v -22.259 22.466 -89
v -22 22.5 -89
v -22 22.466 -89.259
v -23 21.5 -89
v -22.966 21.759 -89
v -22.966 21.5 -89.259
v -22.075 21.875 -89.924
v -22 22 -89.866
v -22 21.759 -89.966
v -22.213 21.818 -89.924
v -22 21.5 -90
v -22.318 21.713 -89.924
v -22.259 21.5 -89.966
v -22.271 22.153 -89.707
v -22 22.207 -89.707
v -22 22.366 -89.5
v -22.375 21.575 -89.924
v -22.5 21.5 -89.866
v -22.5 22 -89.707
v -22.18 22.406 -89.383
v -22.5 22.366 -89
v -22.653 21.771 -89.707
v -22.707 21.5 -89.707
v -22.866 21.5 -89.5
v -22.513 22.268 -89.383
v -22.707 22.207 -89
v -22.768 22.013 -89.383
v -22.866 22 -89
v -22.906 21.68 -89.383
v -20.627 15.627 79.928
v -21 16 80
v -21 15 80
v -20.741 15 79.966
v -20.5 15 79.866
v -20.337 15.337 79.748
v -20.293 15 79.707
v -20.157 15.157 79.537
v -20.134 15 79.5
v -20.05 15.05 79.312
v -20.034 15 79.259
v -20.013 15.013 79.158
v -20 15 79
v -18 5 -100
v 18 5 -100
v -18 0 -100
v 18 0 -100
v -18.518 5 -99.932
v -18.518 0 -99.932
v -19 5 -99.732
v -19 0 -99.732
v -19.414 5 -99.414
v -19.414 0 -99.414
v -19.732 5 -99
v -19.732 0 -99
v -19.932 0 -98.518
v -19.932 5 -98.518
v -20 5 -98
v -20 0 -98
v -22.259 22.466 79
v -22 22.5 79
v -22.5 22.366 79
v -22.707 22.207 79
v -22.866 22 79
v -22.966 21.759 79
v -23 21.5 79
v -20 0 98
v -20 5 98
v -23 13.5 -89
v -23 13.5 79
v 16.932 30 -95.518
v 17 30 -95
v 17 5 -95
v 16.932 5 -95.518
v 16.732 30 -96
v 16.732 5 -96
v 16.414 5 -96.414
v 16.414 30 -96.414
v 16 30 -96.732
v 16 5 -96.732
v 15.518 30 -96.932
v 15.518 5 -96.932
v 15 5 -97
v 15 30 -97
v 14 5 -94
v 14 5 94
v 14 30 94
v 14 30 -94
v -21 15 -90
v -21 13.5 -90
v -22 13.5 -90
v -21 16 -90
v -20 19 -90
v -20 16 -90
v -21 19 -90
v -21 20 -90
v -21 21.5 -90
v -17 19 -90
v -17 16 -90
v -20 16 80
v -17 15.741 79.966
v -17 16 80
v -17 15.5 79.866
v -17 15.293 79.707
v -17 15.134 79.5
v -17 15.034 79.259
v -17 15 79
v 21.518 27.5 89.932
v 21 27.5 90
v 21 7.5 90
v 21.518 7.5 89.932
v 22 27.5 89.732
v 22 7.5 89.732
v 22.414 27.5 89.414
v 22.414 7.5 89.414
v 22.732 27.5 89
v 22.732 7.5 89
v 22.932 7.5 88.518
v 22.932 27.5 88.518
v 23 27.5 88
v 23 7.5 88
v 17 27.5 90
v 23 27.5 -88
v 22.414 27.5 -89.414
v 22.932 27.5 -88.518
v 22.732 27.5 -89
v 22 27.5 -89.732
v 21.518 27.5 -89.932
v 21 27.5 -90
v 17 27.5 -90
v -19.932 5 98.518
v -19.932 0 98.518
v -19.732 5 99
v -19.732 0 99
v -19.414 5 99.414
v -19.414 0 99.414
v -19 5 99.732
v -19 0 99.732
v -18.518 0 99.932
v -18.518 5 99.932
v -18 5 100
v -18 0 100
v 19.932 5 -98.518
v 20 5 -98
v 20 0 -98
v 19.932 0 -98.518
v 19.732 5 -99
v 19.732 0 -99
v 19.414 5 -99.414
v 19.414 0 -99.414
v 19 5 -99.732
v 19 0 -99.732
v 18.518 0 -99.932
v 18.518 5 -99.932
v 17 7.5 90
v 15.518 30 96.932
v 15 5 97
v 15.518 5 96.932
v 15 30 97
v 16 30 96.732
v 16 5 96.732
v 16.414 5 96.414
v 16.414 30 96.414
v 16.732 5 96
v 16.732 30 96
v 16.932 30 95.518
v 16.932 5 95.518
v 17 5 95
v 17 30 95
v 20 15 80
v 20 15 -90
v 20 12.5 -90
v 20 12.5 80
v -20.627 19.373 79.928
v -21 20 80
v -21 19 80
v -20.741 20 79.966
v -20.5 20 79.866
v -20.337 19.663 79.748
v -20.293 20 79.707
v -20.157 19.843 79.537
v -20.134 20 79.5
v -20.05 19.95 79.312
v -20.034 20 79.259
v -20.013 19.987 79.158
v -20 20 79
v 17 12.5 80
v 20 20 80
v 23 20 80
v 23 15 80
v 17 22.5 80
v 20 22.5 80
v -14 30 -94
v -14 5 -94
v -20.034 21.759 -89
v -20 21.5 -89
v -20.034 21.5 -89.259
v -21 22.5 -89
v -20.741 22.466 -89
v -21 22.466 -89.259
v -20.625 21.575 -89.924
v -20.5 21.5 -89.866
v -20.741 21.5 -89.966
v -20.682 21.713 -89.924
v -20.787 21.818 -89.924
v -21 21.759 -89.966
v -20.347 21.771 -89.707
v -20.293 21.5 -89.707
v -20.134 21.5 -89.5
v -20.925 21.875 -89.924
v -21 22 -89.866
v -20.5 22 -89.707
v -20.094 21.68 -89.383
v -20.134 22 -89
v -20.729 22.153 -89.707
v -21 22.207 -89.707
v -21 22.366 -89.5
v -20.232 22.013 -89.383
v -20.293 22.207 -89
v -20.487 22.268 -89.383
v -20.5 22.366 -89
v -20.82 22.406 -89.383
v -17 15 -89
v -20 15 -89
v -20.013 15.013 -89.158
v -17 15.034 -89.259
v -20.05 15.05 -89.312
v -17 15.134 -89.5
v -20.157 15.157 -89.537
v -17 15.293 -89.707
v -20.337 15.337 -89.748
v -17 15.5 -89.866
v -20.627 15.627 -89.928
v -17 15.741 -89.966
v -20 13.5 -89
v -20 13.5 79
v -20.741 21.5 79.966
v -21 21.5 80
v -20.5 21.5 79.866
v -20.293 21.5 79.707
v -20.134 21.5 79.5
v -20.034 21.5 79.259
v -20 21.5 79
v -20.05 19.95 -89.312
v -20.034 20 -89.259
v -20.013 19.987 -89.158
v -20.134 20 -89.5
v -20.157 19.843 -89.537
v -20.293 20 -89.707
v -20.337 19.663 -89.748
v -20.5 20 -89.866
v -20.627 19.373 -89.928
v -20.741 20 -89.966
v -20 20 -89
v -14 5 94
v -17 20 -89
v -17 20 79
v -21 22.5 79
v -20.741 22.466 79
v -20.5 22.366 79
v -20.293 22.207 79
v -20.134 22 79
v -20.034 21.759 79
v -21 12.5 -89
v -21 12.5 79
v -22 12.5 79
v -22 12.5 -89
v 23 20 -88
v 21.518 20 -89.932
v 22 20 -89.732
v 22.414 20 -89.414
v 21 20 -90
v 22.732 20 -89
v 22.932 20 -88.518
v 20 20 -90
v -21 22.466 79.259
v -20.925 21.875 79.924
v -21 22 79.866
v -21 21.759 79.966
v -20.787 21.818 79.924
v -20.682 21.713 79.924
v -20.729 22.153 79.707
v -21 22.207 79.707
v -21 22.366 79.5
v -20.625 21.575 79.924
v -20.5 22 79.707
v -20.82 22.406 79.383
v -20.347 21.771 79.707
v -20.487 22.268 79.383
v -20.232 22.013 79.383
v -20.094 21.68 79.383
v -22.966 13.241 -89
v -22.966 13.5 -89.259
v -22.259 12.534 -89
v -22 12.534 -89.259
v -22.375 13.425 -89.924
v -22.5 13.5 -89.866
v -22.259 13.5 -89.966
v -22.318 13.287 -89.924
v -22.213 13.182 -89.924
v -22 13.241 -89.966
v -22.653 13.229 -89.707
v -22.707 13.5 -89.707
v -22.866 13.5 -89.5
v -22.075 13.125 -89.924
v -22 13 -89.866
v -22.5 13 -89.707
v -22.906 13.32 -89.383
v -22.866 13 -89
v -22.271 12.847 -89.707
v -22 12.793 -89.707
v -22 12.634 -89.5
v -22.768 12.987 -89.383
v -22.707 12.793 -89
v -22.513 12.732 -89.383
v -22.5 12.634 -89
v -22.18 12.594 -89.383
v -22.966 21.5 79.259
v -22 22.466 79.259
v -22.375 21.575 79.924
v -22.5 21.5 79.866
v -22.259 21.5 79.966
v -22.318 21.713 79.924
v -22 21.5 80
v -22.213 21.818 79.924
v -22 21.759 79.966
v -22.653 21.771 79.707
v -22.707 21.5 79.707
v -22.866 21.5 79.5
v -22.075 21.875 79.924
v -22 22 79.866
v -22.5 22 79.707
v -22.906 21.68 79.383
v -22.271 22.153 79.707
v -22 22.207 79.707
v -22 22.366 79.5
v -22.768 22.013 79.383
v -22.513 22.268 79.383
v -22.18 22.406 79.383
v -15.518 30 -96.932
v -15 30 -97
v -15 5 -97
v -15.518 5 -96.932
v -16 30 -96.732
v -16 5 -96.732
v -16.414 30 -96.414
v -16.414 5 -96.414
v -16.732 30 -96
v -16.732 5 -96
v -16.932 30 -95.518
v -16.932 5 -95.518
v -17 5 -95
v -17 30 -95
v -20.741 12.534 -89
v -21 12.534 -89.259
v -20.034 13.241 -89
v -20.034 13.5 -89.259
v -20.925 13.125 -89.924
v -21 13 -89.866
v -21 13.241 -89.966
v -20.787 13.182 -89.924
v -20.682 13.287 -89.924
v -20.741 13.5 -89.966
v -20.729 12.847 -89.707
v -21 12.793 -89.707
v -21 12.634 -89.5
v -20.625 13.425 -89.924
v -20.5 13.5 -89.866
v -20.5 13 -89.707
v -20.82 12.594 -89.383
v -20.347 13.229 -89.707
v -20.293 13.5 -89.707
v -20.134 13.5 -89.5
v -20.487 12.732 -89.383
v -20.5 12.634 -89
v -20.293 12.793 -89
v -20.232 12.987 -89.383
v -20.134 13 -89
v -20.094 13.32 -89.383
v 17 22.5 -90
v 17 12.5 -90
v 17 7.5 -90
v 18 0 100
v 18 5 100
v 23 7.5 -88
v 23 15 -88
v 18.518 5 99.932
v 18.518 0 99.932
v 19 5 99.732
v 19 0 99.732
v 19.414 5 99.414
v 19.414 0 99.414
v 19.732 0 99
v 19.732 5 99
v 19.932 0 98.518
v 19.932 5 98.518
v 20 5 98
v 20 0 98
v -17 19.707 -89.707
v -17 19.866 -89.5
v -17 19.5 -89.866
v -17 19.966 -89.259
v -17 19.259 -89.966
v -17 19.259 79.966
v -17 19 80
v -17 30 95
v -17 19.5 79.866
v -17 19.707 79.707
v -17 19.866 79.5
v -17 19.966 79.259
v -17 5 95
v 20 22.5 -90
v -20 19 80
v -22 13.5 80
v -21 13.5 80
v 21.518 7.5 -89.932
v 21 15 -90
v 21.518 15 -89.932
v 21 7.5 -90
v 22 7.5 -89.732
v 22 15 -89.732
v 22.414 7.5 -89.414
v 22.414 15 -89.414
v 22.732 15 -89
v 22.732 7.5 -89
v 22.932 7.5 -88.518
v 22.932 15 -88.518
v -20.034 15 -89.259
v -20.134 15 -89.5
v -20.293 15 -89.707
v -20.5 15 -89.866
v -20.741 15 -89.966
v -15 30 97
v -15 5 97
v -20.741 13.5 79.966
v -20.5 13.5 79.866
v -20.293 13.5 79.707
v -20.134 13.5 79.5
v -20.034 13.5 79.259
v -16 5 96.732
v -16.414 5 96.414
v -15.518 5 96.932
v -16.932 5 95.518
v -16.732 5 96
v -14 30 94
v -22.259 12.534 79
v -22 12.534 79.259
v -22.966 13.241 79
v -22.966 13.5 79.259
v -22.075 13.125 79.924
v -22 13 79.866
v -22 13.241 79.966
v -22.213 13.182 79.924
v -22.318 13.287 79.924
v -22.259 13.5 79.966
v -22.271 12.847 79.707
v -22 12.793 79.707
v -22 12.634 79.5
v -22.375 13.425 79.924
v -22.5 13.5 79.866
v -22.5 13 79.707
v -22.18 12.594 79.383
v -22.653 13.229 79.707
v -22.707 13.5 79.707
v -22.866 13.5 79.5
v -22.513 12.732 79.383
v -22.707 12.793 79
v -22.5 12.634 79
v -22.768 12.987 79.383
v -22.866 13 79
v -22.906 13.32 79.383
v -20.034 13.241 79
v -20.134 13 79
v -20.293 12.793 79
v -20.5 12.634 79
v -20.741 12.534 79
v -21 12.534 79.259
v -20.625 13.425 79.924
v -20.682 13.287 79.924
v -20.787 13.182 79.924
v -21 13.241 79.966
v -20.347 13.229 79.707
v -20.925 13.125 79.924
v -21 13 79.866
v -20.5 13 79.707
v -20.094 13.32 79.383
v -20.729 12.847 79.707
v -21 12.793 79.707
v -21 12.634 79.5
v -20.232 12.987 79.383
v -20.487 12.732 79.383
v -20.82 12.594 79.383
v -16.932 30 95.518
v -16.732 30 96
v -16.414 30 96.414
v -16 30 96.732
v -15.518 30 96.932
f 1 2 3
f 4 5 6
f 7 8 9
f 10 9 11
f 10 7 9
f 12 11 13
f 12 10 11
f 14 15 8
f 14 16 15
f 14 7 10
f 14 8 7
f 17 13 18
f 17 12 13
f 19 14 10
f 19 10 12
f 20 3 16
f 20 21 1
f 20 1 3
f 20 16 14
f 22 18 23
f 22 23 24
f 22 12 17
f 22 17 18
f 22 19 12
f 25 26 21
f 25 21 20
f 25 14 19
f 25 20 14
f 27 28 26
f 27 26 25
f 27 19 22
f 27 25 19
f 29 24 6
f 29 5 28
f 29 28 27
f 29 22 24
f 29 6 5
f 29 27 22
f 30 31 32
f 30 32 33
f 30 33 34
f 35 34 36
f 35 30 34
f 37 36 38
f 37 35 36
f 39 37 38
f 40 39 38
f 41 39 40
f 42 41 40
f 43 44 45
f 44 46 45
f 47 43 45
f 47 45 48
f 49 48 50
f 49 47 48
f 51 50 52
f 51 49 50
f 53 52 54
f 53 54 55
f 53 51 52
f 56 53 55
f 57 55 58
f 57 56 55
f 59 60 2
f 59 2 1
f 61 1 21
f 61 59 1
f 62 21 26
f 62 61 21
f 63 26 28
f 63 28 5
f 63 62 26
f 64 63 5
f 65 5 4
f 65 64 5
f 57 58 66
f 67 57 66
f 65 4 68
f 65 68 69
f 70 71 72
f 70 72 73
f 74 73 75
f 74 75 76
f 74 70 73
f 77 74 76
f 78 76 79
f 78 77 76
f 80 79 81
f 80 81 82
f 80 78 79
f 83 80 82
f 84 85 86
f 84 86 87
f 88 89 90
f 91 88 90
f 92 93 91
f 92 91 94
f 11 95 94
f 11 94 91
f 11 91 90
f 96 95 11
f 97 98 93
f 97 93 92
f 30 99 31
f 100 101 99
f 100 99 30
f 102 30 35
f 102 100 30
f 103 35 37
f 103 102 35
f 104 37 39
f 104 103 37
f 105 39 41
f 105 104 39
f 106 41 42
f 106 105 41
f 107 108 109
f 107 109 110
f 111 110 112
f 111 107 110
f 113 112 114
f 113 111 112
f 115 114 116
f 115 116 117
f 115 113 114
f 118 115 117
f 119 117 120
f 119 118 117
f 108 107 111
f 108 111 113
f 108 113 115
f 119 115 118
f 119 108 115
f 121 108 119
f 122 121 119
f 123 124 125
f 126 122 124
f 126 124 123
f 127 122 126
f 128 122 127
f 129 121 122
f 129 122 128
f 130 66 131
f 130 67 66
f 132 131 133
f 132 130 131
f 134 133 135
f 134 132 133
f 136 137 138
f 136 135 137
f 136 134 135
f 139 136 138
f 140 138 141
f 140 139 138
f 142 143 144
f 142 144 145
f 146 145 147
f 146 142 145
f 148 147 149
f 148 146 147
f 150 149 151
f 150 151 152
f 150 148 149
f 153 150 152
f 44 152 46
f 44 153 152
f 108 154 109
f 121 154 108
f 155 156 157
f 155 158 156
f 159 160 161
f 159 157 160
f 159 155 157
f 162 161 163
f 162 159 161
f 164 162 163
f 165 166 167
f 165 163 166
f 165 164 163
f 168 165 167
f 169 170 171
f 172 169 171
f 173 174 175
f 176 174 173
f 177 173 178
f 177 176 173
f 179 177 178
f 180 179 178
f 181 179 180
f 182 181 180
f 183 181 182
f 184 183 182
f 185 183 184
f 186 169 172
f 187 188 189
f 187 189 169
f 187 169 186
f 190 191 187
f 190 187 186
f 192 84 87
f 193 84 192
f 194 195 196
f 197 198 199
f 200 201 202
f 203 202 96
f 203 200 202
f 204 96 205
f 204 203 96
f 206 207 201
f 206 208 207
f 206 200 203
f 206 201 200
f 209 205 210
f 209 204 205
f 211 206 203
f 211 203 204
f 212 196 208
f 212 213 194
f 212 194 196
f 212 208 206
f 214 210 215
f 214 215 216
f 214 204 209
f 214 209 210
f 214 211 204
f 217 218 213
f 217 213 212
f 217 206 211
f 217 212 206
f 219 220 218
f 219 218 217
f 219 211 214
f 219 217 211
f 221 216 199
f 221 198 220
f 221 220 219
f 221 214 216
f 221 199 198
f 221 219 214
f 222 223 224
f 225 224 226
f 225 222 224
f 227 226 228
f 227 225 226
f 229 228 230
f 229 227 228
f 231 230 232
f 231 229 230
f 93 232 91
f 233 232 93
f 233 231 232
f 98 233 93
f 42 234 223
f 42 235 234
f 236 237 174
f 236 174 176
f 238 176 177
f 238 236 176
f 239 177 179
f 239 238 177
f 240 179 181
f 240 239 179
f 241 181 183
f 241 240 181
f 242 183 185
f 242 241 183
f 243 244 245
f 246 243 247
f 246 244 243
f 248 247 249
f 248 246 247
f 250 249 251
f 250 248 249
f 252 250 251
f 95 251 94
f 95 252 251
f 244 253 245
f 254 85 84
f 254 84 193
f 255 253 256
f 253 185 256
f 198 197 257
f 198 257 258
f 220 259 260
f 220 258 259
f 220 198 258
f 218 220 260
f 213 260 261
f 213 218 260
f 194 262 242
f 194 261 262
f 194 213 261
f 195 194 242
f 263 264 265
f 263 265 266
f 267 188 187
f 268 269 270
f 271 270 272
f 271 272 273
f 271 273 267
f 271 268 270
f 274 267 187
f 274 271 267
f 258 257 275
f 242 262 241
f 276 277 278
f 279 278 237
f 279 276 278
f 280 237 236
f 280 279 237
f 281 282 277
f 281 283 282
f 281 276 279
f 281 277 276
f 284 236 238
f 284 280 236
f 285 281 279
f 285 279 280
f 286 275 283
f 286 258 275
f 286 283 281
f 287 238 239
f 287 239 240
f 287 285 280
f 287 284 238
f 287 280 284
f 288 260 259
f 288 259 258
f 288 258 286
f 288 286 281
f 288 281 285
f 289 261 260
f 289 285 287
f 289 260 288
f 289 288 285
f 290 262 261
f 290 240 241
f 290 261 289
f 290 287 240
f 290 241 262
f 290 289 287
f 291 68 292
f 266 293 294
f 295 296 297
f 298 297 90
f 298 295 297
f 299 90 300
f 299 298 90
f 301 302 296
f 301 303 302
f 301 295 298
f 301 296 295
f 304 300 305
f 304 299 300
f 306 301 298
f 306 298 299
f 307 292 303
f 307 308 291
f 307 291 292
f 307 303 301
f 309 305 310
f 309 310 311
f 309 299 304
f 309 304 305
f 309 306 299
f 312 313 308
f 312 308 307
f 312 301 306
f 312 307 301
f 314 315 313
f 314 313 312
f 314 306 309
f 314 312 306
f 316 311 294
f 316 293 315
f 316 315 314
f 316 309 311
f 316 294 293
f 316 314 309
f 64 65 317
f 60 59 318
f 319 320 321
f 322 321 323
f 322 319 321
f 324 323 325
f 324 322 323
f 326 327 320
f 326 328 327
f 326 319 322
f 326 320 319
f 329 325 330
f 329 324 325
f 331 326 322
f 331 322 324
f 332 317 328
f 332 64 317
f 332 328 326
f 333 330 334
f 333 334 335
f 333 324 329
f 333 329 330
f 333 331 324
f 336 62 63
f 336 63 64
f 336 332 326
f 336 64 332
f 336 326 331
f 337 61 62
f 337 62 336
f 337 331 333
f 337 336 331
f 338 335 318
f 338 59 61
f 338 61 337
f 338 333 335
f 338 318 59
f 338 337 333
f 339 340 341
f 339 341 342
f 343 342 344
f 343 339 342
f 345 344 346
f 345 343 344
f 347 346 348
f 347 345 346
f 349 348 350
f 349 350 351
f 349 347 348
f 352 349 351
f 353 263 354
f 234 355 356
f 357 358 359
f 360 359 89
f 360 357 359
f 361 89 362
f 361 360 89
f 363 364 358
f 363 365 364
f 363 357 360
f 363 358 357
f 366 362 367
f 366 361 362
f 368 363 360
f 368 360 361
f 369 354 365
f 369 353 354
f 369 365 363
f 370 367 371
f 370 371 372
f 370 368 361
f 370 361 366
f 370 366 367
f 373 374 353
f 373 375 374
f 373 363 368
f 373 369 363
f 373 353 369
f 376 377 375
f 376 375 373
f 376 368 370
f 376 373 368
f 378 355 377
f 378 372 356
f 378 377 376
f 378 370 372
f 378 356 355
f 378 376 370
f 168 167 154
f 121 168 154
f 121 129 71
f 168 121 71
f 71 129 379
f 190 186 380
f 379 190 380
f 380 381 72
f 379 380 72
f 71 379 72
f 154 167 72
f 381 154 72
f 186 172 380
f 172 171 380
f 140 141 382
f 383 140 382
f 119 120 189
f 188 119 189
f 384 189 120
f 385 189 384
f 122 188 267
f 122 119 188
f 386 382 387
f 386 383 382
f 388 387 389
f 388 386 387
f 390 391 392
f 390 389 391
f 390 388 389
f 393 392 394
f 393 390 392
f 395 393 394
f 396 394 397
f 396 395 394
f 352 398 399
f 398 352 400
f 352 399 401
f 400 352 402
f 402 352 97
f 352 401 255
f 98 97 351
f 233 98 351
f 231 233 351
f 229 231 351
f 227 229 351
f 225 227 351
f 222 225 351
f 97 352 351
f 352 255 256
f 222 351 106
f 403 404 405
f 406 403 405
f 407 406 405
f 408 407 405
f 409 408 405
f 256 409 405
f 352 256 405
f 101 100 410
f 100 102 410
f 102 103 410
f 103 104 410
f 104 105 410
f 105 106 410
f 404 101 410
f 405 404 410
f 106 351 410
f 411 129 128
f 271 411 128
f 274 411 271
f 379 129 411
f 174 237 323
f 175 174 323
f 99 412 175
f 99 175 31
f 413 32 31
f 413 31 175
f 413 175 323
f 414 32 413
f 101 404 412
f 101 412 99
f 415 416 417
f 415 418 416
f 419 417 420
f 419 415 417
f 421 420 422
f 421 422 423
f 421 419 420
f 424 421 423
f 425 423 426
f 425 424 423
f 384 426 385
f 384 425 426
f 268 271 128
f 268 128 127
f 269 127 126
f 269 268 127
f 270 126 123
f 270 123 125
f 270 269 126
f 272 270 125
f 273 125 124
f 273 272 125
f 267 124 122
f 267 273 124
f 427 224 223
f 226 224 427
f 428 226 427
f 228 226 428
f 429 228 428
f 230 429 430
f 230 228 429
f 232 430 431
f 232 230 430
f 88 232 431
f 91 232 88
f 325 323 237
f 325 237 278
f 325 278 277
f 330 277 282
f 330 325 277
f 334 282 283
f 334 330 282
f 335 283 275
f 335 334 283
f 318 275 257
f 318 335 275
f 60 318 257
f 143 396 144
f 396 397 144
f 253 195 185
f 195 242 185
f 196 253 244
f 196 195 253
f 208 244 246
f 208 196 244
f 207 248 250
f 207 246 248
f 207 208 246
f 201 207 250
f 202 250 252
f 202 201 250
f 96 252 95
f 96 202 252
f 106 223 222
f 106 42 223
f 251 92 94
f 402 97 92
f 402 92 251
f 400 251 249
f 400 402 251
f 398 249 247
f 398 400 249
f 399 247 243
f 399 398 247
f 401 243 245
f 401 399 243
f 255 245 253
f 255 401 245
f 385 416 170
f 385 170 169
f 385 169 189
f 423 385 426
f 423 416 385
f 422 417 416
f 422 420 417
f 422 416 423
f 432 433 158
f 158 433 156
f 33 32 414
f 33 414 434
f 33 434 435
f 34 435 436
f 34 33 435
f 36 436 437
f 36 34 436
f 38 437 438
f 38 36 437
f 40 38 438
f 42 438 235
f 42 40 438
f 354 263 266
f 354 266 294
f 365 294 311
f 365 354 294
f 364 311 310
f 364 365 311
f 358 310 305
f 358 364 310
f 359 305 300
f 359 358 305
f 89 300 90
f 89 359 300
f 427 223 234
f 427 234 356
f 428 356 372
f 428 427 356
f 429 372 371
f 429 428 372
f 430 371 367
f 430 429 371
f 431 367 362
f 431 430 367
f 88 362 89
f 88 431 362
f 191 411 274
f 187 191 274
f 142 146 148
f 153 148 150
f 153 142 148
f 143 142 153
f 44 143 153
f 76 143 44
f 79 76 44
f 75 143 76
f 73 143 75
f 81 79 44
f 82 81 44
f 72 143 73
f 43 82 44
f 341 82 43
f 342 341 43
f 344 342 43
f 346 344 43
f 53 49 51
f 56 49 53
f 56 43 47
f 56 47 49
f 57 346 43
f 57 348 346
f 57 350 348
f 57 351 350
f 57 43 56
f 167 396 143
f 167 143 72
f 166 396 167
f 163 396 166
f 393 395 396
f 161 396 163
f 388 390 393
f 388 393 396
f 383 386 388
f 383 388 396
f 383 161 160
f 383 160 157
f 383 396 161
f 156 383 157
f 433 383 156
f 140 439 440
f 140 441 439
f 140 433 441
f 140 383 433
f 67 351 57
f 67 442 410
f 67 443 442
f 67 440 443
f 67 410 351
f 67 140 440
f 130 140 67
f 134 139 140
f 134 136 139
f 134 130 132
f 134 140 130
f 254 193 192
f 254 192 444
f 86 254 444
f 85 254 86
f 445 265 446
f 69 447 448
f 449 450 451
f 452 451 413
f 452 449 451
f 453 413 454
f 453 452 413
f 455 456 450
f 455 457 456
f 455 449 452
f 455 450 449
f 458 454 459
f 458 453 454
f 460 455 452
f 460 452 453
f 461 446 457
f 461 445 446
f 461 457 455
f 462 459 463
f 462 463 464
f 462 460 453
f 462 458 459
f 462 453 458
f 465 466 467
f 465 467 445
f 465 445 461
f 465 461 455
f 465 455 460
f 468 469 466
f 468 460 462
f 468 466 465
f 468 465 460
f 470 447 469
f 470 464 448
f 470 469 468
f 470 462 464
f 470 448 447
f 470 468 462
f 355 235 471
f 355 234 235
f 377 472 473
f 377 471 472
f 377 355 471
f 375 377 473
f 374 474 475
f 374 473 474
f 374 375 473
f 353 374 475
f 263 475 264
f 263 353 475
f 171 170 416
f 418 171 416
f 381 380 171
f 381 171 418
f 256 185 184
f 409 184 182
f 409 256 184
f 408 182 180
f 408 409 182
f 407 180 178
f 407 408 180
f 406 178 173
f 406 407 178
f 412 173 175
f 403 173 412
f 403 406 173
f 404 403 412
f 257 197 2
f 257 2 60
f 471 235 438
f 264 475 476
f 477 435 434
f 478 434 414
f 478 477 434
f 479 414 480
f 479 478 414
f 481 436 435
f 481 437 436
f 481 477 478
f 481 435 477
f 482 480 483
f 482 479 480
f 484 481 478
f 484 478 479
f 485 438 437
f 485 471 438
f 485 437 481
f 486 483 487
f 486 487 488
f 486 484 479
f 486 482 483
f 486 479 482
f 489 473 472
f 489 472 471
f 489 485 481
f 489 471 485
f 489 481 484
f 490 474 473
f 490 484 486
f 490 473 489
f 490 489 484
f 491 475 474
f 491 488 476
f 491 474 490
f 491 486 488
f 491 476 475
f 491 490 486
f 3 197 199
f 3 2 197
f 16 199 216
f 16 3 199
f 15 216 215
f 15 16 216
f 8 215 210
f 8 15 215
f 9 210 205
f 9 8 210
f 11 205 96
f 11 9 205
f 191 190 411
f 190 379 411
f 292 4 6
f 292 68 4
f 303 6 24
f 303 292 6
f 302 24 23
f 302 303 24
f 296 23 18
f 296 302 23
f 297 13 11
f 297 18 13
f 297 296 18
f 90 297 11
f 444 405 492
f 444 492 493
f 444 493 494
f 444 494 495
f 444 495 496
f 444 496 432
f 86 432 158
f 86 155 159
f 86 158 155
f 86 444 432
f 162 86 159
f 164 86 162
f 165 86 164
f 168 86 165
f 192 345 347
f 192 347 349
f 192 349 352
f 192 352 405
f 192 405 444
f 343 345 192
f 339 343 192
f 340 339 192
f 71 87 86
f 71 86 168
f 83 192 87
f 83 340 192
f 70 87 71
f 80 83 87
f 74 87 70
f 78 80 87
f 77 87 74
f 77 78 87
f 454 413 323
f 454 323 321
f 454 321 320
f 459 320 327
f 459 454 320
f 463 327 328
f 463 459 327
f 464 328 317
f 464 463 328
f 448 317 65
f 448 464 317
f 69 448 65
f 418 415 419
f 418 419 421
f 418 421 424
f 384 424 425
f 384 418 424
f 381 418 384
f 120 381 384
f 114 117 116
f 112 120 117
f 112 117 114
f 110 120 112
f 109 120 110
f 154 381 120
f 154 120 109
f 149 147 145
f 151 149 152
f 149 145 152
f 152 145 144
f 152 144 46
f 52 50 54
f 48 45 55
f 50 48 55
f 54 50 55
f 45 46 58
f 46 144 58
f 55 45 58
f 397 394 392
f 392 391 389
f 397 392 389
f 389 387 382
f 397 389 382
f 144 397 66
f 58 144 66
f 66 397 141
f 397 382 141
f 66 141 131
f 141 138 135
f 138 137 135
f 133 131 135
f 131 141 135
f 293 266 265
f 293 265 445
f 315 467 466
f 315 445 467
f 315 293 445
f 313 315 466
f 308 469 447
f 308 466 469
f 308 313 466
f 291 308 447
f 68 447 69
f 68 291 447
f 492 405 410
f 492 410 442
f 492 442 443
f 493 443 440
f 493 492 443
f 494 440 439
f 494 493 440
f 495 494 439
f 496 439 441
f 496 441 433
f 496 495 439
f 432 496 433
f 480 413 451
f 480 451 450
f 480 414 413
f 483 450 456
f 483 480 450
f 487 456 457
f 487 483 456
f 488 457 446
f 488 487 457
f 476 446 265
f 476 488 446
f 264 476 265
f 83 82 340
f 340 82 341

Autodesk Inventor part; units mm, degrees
ref_plane "YZ Plane" through (0, 0, 0) normal (1, 0, 0) x (0, 1, 0)
ref_plane "XZ Plane" through (0, 0, 0) normal (0, 1, 0) x (-1, 0, 0)
ref_plane "XY Plane" through (0, 0, 0) normal (0, 0, 1) x (1, 0, 0)
sketch "Sketch2" plane through (0, 0, 0) normal (0, 1, 0) x (-1, 0, 0)
  line L0 (-20, -100) -> (20, -100)
  line L1 (20, -100) -> (20, 100)
  line L2 (20, 100) -> (-20, 100)
  line L3 (-20, 100) -> (-20, -100)
  line L4 (-20, -100) -> (20, 100) construction
  line L5 (20, -100) -> (-20, 100) construction
  point P0 (0, 0)
  dimension "d0" = 40
  dimension "d1" = 200
extrude "Extrusion1" add sketch "Sketch2" along normal blind 5
sketch "Sketch3" plane through (0, 5, 0) normal (0, 1, 0) x (1, 0, 0)
  line L0 (17, 97) -> (-17, 97)
  line L1 (-17, 97) -> (-17, -97)
  line L2 (-17, -97) -> (17, -97)
  line L3 (17, -97) -> (17, 97)
  line L4 (17, 97) -> (-17, -97) construction
  line L5 (-17, 97) -> (17, -97) construction
  line L6 (-20, 100) -> (-20, -100) projected
  line L7 (-20, -100) -> (20, -100) projected
  line L8 (14, 94) -> (-14, 94)
  line L9 (-14, 94) -> (-14, -94)
  line L10 (-14, -94) -> (14, -94)
  line L11 (14, -94) -> (14, 94)
  line L12 (14, 94) -> (-14, -94) construction
  line L13 (-14, 94) -> (14, -94) construction
  point P0 (0, 0)
  dimension "d4" = 3
  dimension "d5" = 3
  dimension "d6" = 3
  dimension "d7" = 3
extrude "Extrusion2" add sketch "Sketch3" along normal blind 25
fillet "Fillet1" radius 2 8 edges at (17, 17.5, 97) (-17, 17.5, 97) (-20, 2.5, 100) (20, 2.5, 100) (17, 17.5, -97) (-17, 17.5, -97) (20, 2.5, -100) (-20, 2.5, -100)
sketch "Sketch4" plane through (17, 5, 95) normal (1, 0, 0) x (0, 0, -1)
  line L0 (5, 22.5) -> (185, 22.5)
  line L1 (185, 22.5) -> (185, 2.5)
  line L2 (185, 2.5) -> (5, 2.5)
  line L3 (5, 2.5) -> (5, 22.5)
  line L4 (190, 25) -> (190, 0) projected
  line L5 (0, 25) -> (190, 25) projected
  line L6 (0, 0) -> (0, 25) projected
  line L7 (190, 0) -> (0, 0) projected
  line L8 (-5, 0) -> (-5, -5) projected
  line L9 (195, -5) -> (195, 0) projected
  point P0 (95, -5)
  point P1 (0, 12.5)
  dimension "d42" = 10
  dimension "d43" = 10
  dimension "d44" = 20
  dimension "d45" = 10
extrude "Extrusion3" add sketch "Sketch4" along normal blind 6 contours L0 L1 L2 L3
sketch "Sketch5" plane through (17, 7.5, -90) normal (0, 0, -1) x (-1, 0, 0)
  line L0 (0, 20) -> (0, 0) projected
  line L1 (0, 20) -> (-6, 20) projected
  line L2 (-6, 0) -> (-6, 20) projected
  line L3 (0, 0) -> (-6, 0) projected
  line L4 (-6, 12.5) -> (-3, 12.5)
  line L5 (-3, 12.5) -> (-3, 7.5)
  line L6 (-3, 7.5) -> (-6, 7.5)
  line L7 (-6, 7.5) -> (-6, 12.5)
  line L8 (0, 15) -> (-3, 15)
  line L9 (-3, 15) -> (-3, 5)
  line L10 (-3, 5) -> (0, 5)
  line L11 (0, 5) -> (0, 15)
  point P0 (17, -7.5)
  point P1 (-4.5, 7.5)
  point P2 (-4.5, 12.5)
  point P3 (-6, 7.5)
  point P4 (-3, 7.5)
  point P5 (0, 5)
  point P6 (-1.5, 15)
  dimension "d17" = 3
  dimension "d20" = 5
  dimension "d21" = 5
  dimension "d46" = 2.5
  dimension "d47" = 2.5
extrude "Extrusion4" cut sketch "Sketch5" against normal blind 170 contours L0 L10 L9 L5 L8 | L4 L5 L6 L2
sketch "Sketch6" plane through (-17, 5, -95) normal (-1, 0, 0) x (0, 0, 1)
  line L0 (0, 0) -> (0, 25) projected
  line L1 (190, 0) -> (0, 0) projected
  line L2 (190, 25) -> (190, 0) projected
  line L3 (0, 25) -> (190, 25) projected
  line L4 (5, 17.5) -> (175, 17.5)
  line L5 (175, 17.5) -> (175, 7.5)
  line L6 (175, 7.5) -> (5, 7.5)
  line L7 (5, 7.5) -> (5, 17.5)
  line L8 (195, -5) -> (195, 0) projected
  line L9 (-5, 0) -> (-5, -5) projected
  point P0 (95, -5)
  point P1 (0, 12.5)
  dimension "d48" = 20
  dimension "d49" = 10
  dimension "d50" = 5
  dimension "d51" = 10
extrude "Extrusion5" add sketch "Sketch6" along normal blind 6 contours L4 L5 L6 L7
sketch "Sketch7" plane through (-17, 12.5, 80) normal (0, 0, 1) x (1, 0, 0)
  line L0 (0, 10) -> (0, 0) projected
  line L1 (0, 10) -> (-6, 10) projected
  line L2 (-6, 0) -> (-6, 10) projected
  line L3 (0, 0) -> (-6, 0) projected
  line L4 (0, 10) -> (-3, 10)
  line L5 (-3, 10) -> (-3, 7.5)
  line L6 (-3, 7.5) -> (0, 7.5)
  line L7 (0, 7.5) -> (0, 10)
  line L8 (0, 0) -> (-3, 0)
  line L9 (-3, 0) -> (-3, 2.5)
  line L10 (-3, 2.5) -> (0, 2.5)
  line L11 (0, 2.5) -> (0, 0)
  point P0 (17, -12.5)
  dimension "d30" = 3
  dimension "d31" = 2.5
  dimension "d32" = 3
  dimension "d33" = 2.5
extrude "Extrusion6" cut sketch "Sketch7" against normal up to surface (170 mm away) contours L0 L6 L5 L1 | L0 L3 L9 L10
fillet "Fillet3" radius 1 4 edges at (-18.5, 20, -90) (-18.5, 15, -90) (-18.5, 20, 80) (-18.5, 15, 80)
fillet "Fillet4" radius 1 4 edges at (-23, 22.5, -5) (-20, 22.5, -5) (-23, 12.5, -5) (-20, 12.5, -5)
fillet "Fillet5" radius 2 3 edges at (23, 17.5, 90) (23, 23.75, -90) (23, 11.25, -90)
fillet "Fillet6" radius 1 9 edges at (-22.7071, 22.2071, 80) (-21.5, 22.5, 80) (-20.2929, 22.2071, 80) (-20, 20.75, 80) (-22.7071, 12.7929, 80) (-21.5, 12.5, 80) (-20.2929, 12.7929, 80) (-20, 14.25, 80) (-23, 17.5, 80)
fillet "Fillet7" radius 1 9 edges at (-20.2929, 22.2071, -90) (-21.5, 22.5, -90) (-22.7071, 22.2071, -90) (-23, 17.5, -90) (-22.7071, 12.7929, -90) (-21.5, 12.5, -90) (-20.2929, 12.7929, -90) (-20, 14.25, -90) (-20, 20.75, -90)
properties part number "module_switch"
